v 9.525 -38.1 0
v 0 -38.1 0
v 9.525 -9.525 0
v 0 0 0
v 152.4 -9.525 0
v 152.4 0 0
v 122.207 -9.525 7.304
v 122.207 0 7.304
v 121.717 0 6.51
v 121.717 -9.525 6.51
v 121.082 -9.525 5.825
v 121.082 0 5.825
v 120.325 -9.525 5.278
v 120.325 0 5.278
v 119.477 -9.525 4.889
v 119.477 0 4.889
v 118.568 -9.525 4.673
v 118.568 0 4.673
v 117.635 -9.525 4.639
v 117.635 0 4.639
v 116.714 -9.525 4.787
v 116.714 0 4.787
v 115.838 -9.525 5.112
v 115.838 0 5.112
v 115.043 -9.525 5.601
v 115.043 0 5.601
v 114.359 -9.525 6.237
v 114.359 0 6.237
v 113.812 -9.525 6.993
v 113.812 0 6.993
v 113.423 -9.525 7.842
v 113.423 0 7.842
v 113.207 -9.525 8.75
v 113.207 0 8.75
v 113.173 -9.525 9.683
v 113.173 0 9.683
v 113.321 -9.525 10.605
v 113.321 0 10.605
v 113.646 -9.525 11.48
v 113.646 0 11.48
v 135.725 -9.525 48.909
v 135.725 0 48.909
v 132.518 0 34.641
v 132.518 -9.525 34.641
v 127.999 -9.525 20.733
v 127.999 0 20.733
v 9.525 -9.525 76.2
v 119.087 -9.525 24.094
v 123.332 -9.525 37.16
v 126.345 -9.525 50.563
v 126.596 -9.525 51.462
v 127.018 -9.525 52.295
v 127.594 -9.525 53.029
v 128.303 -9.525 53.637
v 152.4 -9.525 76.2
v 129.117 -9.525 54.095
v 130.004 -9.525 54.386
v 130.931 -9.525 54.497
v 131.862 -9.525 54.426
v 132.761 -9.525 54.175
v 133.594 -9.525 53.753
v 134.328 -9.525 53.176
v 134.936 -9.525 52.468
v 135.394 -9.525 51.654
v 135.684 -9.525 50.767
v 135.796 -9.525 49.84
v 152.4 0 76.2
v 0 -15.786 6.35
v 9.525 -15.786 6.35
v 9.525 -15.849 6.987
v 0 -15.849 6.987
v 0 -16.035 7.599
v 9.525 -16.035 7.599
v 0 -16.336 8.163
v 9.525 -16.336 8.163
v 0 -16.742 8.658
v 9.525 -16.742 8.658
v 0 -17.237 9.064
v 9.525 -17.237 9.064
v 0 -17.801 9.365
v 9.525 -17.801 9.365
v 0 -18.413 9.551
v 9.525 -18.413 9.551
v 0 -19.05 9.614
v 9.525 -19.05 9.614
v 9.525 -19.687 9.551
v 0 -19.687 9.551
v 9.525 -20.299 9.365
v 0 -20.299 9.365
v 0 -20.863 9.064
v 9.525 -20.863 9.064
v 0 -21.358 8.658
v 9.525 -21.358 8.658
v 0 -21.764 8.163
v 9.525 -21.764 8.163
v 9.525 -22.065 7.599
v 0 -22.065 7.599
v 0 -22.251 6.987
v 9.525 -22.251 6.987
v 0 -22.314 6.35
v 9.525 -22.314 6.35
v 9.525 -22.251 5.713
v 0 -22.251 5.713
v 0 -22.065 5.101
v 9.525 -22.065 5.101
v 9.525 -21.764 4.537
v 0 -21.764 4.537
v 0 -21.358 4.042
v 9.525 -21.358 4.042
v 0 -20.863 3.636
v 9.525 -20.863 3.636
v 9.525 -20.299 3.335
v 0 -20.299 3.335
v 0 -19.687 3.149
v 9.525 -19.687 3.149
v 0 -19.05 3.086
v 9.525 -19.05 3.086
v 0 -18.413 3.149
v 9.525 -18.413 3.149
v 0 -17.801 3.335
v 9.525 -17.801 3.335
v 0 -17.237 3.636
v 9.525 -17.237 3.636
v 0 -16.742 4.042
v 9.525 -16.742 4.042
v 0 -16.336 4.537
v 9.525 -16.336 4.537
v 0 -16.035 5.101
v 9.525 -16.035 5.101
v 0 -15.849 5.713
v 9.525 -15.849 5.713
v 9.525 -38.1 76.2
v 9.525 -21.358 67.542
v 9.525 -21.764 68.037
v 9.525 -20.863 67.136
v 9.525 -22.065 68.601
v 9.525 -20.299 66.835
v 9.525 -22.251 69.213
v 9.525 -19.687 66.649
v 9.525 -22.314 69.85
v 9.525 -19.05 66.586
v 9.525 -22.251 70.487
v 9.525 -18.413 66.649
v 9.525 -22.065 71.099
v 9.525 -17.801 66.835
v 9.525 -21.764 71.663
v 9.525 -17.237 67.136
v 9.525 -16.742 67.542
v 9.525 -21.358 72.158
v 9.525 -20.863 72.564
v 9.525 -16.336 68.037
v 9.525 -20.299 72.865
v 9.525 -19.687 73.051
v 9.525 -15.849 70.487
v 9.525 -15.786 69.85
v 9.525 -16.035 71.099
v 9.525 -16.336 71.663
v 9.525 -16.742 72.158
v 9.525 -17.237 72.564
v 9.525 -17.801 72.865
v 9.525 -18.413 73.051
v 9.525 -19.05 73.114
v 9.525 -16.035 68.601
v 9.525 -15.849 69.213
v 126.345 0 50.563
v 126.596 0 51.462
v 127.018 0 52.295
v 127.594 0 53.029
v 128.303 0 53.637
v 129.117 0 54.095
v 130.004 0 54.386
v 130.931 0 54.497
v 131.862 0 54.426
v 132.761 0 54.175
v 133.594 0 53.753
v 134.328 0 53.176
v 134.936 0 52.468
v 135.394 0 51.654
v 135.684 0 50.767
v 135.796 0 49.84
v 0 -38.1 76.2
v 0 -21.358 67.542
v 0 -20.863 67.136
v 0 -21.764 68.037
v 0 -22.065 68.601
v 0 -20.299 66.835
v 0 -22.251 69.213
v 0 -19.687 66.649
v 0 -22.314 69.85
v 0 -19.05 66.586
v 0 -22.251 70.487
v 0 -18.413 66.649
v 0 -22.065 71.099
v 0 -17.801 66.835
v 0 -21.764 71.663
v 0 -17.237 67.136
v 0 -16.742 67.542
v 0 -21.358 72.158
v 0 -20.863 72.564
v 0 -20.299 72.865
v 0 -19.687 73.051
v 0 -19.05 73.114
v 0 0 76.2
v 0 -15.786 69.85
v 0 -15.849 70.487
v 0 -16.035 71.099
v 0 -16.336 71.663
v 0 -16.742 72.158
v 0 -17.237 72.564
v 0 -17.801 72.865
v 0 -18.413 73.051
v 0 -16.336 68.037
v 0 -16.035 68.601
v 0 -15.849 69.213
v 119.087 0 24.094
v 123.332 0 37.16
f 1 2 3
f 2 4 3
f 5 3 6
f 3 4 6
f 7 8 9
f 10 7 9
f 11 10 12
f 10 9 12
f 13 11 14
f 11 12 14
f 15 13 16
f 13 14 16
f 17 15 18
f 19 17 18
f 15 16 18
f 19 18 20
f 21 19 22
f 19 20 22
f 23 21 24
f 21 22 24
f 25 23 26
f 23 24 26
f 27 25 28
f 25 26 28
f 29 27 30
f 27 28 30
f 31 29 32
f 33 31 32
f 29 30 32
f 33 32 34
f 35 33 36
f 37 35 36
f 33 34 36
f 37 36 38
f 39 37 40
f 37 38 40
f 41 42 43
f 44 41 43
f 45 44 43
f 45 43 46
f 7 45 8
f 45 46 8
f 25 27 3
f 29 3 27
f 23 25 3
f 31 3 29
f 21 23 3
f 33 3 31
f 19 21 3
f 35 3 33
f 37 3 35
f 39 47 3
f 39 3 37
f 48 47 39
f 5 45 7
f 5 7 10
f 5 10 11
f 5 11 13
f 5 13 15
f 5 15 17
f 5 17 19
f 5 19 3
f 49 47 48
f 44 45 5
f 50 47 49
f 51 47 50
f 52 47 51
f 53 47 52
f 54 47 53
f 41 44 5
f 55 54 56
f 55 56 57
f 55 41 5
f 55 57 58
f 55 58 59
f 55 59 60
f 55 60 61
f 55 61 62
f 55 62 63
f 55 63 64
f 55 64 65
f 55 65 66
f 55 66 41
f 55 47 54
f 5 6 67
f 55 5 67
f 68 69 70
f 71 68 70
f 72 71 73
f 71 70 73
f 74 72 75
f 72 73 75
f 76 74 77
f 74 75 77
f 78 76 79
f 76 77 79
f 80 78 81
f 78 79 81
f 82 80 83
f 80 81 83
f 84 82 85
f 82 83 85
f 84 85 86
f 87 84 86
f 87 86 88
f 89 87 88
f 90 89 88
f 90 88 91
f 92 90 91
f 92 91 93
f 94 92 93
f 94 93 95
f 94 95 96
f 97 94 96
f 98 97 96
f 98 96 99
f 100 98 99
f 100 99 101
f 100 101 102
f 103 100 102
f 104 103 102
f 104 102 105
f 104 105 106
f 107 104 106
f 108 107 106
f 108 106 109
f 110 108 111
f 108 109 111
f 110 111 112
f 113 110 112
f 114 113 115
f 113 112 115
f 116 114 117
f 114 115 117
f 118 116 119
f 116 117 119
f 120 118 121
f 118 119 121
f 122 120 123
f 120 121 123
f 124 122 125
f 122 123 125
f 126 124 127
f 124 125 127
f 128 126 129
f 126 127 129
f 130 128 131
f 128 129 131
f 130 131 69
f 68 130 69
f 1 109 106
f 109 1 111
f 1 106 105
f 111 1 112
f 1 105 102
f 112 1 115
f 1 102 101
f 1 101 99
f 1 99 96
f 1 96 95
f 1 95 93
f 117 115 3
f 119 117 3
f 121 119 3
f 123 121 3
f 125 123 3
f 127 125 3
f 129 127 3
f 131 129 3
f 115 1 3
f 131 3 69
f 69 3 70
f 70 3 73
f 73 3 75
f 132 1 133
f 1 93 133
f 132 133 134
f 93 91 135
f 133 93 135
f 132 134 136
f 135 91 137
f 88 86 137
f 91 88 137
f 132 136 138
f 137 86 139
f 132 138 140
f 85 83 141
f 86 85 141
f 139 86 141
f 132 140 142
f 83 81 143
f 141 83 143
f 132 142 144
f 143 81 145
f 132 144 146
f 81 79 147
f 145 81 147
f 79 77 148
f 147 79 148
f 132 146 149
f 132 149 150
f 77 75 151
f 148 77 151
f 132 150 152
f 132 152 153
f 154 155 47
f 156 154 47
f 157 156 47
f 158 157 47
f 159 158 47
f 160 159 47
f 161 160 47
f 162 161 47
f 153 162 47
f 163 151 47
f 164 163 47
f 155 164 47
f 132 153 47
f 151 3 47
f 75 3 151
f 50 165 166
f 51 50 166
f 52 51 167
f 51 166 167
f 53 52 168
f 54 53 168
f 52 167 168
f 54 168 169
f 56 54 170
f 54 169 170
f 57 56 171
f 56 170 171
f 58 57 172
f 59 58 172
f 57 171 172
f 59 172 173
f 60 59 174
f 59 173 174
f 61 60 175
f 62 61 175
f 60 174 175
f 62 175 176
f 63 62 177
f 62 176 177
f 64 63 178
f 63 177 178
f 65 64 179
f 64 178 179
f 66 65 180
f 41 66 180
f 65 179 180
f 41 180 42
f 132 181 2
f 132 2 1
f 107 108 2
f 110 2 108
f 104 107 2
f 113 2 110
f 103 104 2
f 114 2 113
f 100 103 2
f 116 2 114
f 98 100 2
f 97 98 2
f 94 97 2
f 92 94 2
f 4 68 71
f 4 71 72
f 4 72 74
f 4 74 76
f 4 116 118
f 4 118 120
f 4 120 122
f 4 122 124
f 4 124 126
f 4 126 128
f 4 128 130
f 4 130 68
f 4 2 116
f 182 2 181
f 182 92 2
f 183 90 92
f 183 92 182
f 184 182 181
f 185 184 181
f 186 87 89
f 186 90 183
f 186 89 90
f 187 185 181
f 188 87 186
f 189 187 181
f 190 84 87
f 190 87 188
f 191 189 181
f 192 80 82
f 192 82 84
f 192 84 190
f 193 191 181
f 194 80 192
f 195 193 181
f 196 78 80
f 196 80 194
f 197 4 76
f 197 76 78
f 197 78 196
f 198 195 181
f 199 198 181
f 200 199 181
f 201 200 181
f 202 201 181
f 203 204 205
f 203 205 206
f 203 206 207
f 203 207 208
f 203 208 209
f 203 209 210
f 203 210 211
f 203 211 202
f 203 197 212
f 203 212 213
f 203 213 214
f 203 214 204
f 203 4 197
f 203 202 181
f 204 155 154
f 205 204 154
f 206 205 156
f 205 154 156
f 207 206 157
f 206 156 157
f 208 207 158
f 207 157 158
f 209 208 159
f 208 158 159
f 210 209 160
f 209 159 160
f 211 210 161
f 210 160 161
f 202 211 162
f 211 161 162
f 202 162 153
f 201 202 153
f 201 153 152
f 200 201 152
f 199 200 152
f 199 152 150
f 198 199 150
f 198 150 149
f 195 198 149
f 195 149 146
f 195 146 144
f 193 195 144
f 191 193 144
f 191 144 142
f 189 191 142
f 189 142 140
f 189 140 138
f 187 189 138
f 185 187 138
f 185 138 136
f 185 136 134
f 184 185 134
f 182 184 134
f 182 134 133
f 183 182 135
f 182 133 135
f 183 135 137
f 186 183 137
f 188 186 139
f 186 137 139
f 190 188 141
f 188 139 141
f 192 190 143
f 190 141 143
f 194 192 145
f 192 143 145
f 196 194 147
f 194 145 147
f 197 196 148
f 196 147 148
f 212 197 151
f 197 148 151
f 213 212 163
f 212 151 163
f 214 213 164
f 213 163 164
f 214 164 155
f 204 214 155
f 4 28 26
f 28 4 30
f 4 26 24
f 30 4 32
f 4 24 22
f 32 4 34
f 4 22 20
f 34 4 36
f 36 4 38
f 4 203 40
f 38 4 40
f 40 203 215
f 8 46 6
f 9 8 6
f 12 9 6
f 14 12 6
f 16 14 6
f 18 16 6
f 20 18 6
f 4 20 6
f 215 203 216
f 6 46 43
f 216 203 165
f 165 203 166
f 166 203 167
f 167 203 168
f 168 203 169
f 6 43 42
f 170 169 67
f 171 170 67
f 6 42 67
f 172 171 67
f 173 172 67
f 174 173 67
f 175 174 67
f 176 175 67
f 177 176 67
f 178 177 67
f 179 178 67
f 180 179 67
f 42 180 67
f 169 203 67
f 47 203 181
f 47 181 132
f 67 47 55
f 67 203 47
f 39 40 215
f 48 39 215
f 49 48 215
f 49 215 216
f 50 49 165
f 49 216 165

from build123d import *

# Parameters (mm, degrees)
F0_W     = 152.4
F0_H     = 76.2
F1_DEPTH = 9.525
F2_W     = 9.525
F2_H     = 76.2
F3_DEPTH = 28.575
F5_D     = 6.5278


with BuildPart() as f1:
    # F0 (on Front) → F1 (new body)
    with BuildSketch(Plane.XZ):
        with Locations((76.2, 38.1)):
            Rectangle(F0_W, F0_H)
        with BuildLine():
            ThreePointArc((135.724848, 48.909018), (130.42042, 27.634117), (122.206719, 7.304495))
            ThreePointArc((122.206719, 7.304495), (115.83847, 5.111731), (113.645706, 11.47998))
            ThreePointArc((113.645706, 11.47998), (121.361606, 30.577503), (126.344555, 50.563017))
            ThreePointArc((126.344555, 50.563017), (131.861701, 54.426165), (135.724848, 48.909018))
        make_face(mode=Mode.SUBTRACT)
    extrude(amount=F1_DEPTH)

    # F2 (on face) → F3 (join)
    with BuildSketch(Plane.XZ.offset(9.525)):
        with Locations((4.7625, 38.1)):
            Rectangle(F2_W, F2_H)
    extrude(amount=F3_DEPTH)

    # F5 (through all)
    with Locations(Plane(origin=(0, 0, 0), x_dir=(0, -1, 0), z_dir=(-1, 0, 0))):
        with Locations((19.05, 69.85), (19.05, 6.35)):
            Hole(F5_D / 2)


solid = f1.part
